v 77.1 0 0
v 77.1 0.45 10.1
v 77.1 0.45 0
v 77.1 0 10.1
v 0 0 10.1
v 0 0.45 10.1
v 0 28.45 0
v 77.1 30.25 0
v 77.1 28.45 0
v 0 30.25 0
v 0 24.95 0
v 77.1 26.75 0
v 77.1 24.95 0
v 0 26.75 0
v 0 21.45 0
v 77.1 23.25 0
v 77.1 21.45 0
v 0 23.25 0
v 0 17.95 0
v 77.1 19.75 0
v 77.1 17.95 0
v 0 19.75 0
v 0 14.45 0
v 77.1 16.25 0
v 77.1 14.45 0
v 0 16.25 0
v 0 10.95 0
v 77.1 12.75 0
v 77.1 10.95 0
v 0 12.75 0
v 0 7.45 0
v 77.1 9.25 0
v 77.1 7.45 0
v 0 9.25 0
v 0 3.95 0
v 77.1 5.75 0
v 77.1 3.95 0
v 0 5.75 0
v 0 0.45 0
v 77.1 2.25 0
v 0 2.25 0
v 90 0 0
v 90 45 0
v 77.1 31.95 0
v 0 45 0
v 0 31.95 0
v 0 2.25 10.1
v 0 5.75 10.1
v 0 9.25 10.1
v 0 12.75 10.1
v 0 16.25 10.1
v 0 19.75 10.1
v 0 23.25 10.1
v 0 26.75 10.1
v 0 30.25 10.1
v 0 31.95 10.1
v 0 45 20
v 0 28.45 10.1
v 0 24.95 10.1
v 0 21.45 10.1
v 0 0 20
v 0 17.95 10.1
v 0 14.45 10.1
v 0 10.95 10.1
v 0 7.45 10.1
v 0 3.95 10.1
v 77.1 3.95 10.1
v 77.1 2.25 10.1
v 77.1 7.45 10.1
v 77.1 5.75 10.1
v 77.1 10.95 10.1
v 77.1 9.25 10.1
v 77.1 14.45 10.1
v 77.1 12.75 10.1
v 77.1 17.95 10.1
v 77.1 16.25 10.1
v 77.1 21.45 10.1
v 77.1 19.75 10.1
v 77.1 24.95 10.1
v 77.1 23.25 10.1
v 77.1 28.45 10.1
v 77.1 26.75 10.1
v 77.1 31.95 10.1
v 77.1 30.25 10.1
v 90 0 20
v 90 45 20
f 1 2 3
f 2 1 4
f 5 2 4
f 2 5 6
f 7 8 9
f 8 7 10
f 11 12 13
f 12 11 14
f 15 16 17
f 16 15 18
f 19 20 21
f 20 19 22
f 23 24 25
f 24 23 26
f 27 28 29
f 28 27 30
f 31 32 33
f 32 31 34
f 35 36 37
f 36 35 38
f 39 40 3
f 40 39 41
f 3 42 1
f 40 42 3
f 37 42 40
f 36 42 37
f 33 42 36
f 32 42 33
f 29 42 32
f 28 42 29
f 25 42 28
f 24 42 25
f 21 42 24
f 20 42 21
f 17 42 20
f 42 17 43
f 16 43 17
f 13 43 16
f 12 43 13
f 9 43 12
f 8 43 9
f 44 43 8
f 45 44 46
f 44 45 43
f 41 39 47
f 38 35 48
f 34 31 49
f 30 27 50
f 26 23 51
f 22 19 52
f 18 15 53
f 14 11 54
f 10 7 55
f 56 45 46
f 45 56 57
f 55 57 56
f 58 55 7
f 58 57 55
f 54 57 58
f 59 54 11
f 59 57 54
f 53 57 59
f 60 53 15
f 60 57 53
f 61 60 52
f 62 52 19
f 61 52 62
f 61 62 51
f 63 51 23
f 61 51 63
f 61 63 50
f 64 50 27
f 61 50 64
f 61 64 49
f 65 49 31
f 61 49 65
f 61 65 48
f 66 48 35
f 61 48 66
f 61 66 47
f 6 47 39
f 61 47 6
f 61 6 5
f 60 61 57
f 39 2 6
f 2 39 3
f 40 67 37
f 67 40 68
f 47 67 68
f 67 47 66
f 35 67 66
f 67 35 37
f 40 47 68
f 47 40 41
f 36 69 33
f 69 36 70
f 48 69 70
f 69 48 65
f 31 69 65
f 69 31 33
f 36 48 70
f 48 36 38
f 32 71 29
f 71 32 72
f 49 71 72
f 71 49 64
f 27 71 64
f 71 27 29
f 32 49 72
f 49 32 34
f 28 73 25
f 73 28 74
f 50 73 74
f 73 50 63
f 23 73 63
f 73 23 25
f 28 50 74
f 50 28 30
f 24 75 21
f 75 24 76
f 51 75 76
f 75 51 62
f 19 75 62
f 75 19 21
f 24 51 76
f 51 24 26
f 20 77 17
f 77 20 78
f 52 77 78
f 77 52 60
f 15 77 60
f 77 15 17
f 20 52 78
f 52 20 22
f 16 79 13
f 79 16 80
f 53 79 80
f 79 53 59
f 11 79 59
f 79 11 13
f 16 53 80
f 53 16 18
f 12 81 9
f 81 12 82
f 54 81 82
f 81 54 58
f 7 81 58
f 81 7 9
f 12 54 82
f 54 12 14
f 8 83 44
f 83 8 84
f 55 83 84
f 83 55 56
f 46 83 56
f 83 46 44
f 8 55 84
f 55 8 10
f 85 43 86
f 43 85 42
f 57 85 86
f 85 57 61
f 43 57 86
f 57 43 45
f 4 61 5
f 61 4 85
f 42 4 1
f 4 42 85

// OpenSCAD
$fn = 128;

// --- Dimensions ---
// Base block dimensions
base_length_X = 90;
base_width_Y = 45;
base_height_Z = 20;

// Slide dimensions (mm)
slide_length = 75;
slide_width = 25;
slide_thickness = 1;

// Slot dimensions
slot_length = 77;
slot_width = 1.6;
slot_depth = 10;

// Slot spacing and positioning
slot_spacing = 3.5; // Centre-to-centre in Y
num_slots = 10;

// --- Calculation ---
// Calculate the Y position of the first slot to center the group
// Total width occupied by slots = num_slots * slot_width
// Total spacing between slots = (num_slots - 1) * slot_spacing
// Total group width = (num_slots * slot_width) + ((num_slots - 1) * slot_spacing)
// Offset from center = (Total group width / 2)
// First slot center Y = Offset - (Total group width / 2) + (slot_width / 2)
// Simplified: First slot center Y = (base_width_Y / 2) - (Total group width / 2)

total_group_width = (num_slots * slot_width) + ((num_slots - 1) * slot_spacing);
first_slot_center_Y = (base_width_Y / 2) - (total_group_width / 2);

// --- Build ---

difference() {
    // 1. Create the solid base block
    // Centered on origin, resting on Z=0
    translate([0, 0, 0])
        cube([base_length_X, base_width_Y, base_height_Z]);

    // 2. Cut the 10 parallel slots
    // Slots run along X, so they are extruded in X direction.
    // We use a for loop to position them along Y.
    for (i = [0 : num_slots - 1]) {
        // Calculate Y position for current slot
        // i=0 is the first slot, i=num_slots-1 is the last
        current_slot_Y = first_slot_center_Y + (i * slot_spacing);
        
        // Define the cutting shape
        // The slot is 77mm long (X), 1.6mm wide (Y), 10mm deep (Z)
        // We extend slightly past the faces (0.1mm) to ensure clean cut
        cut_length = slot_length + 0.1;
        cut_width = slot_width + 0.1;
        cut_depth = slot_depth + 0.1;
        
        translate([0, current_slot_Y, 0])
            cube([cut_length, cut_width, cut_depth]);
    }
}
